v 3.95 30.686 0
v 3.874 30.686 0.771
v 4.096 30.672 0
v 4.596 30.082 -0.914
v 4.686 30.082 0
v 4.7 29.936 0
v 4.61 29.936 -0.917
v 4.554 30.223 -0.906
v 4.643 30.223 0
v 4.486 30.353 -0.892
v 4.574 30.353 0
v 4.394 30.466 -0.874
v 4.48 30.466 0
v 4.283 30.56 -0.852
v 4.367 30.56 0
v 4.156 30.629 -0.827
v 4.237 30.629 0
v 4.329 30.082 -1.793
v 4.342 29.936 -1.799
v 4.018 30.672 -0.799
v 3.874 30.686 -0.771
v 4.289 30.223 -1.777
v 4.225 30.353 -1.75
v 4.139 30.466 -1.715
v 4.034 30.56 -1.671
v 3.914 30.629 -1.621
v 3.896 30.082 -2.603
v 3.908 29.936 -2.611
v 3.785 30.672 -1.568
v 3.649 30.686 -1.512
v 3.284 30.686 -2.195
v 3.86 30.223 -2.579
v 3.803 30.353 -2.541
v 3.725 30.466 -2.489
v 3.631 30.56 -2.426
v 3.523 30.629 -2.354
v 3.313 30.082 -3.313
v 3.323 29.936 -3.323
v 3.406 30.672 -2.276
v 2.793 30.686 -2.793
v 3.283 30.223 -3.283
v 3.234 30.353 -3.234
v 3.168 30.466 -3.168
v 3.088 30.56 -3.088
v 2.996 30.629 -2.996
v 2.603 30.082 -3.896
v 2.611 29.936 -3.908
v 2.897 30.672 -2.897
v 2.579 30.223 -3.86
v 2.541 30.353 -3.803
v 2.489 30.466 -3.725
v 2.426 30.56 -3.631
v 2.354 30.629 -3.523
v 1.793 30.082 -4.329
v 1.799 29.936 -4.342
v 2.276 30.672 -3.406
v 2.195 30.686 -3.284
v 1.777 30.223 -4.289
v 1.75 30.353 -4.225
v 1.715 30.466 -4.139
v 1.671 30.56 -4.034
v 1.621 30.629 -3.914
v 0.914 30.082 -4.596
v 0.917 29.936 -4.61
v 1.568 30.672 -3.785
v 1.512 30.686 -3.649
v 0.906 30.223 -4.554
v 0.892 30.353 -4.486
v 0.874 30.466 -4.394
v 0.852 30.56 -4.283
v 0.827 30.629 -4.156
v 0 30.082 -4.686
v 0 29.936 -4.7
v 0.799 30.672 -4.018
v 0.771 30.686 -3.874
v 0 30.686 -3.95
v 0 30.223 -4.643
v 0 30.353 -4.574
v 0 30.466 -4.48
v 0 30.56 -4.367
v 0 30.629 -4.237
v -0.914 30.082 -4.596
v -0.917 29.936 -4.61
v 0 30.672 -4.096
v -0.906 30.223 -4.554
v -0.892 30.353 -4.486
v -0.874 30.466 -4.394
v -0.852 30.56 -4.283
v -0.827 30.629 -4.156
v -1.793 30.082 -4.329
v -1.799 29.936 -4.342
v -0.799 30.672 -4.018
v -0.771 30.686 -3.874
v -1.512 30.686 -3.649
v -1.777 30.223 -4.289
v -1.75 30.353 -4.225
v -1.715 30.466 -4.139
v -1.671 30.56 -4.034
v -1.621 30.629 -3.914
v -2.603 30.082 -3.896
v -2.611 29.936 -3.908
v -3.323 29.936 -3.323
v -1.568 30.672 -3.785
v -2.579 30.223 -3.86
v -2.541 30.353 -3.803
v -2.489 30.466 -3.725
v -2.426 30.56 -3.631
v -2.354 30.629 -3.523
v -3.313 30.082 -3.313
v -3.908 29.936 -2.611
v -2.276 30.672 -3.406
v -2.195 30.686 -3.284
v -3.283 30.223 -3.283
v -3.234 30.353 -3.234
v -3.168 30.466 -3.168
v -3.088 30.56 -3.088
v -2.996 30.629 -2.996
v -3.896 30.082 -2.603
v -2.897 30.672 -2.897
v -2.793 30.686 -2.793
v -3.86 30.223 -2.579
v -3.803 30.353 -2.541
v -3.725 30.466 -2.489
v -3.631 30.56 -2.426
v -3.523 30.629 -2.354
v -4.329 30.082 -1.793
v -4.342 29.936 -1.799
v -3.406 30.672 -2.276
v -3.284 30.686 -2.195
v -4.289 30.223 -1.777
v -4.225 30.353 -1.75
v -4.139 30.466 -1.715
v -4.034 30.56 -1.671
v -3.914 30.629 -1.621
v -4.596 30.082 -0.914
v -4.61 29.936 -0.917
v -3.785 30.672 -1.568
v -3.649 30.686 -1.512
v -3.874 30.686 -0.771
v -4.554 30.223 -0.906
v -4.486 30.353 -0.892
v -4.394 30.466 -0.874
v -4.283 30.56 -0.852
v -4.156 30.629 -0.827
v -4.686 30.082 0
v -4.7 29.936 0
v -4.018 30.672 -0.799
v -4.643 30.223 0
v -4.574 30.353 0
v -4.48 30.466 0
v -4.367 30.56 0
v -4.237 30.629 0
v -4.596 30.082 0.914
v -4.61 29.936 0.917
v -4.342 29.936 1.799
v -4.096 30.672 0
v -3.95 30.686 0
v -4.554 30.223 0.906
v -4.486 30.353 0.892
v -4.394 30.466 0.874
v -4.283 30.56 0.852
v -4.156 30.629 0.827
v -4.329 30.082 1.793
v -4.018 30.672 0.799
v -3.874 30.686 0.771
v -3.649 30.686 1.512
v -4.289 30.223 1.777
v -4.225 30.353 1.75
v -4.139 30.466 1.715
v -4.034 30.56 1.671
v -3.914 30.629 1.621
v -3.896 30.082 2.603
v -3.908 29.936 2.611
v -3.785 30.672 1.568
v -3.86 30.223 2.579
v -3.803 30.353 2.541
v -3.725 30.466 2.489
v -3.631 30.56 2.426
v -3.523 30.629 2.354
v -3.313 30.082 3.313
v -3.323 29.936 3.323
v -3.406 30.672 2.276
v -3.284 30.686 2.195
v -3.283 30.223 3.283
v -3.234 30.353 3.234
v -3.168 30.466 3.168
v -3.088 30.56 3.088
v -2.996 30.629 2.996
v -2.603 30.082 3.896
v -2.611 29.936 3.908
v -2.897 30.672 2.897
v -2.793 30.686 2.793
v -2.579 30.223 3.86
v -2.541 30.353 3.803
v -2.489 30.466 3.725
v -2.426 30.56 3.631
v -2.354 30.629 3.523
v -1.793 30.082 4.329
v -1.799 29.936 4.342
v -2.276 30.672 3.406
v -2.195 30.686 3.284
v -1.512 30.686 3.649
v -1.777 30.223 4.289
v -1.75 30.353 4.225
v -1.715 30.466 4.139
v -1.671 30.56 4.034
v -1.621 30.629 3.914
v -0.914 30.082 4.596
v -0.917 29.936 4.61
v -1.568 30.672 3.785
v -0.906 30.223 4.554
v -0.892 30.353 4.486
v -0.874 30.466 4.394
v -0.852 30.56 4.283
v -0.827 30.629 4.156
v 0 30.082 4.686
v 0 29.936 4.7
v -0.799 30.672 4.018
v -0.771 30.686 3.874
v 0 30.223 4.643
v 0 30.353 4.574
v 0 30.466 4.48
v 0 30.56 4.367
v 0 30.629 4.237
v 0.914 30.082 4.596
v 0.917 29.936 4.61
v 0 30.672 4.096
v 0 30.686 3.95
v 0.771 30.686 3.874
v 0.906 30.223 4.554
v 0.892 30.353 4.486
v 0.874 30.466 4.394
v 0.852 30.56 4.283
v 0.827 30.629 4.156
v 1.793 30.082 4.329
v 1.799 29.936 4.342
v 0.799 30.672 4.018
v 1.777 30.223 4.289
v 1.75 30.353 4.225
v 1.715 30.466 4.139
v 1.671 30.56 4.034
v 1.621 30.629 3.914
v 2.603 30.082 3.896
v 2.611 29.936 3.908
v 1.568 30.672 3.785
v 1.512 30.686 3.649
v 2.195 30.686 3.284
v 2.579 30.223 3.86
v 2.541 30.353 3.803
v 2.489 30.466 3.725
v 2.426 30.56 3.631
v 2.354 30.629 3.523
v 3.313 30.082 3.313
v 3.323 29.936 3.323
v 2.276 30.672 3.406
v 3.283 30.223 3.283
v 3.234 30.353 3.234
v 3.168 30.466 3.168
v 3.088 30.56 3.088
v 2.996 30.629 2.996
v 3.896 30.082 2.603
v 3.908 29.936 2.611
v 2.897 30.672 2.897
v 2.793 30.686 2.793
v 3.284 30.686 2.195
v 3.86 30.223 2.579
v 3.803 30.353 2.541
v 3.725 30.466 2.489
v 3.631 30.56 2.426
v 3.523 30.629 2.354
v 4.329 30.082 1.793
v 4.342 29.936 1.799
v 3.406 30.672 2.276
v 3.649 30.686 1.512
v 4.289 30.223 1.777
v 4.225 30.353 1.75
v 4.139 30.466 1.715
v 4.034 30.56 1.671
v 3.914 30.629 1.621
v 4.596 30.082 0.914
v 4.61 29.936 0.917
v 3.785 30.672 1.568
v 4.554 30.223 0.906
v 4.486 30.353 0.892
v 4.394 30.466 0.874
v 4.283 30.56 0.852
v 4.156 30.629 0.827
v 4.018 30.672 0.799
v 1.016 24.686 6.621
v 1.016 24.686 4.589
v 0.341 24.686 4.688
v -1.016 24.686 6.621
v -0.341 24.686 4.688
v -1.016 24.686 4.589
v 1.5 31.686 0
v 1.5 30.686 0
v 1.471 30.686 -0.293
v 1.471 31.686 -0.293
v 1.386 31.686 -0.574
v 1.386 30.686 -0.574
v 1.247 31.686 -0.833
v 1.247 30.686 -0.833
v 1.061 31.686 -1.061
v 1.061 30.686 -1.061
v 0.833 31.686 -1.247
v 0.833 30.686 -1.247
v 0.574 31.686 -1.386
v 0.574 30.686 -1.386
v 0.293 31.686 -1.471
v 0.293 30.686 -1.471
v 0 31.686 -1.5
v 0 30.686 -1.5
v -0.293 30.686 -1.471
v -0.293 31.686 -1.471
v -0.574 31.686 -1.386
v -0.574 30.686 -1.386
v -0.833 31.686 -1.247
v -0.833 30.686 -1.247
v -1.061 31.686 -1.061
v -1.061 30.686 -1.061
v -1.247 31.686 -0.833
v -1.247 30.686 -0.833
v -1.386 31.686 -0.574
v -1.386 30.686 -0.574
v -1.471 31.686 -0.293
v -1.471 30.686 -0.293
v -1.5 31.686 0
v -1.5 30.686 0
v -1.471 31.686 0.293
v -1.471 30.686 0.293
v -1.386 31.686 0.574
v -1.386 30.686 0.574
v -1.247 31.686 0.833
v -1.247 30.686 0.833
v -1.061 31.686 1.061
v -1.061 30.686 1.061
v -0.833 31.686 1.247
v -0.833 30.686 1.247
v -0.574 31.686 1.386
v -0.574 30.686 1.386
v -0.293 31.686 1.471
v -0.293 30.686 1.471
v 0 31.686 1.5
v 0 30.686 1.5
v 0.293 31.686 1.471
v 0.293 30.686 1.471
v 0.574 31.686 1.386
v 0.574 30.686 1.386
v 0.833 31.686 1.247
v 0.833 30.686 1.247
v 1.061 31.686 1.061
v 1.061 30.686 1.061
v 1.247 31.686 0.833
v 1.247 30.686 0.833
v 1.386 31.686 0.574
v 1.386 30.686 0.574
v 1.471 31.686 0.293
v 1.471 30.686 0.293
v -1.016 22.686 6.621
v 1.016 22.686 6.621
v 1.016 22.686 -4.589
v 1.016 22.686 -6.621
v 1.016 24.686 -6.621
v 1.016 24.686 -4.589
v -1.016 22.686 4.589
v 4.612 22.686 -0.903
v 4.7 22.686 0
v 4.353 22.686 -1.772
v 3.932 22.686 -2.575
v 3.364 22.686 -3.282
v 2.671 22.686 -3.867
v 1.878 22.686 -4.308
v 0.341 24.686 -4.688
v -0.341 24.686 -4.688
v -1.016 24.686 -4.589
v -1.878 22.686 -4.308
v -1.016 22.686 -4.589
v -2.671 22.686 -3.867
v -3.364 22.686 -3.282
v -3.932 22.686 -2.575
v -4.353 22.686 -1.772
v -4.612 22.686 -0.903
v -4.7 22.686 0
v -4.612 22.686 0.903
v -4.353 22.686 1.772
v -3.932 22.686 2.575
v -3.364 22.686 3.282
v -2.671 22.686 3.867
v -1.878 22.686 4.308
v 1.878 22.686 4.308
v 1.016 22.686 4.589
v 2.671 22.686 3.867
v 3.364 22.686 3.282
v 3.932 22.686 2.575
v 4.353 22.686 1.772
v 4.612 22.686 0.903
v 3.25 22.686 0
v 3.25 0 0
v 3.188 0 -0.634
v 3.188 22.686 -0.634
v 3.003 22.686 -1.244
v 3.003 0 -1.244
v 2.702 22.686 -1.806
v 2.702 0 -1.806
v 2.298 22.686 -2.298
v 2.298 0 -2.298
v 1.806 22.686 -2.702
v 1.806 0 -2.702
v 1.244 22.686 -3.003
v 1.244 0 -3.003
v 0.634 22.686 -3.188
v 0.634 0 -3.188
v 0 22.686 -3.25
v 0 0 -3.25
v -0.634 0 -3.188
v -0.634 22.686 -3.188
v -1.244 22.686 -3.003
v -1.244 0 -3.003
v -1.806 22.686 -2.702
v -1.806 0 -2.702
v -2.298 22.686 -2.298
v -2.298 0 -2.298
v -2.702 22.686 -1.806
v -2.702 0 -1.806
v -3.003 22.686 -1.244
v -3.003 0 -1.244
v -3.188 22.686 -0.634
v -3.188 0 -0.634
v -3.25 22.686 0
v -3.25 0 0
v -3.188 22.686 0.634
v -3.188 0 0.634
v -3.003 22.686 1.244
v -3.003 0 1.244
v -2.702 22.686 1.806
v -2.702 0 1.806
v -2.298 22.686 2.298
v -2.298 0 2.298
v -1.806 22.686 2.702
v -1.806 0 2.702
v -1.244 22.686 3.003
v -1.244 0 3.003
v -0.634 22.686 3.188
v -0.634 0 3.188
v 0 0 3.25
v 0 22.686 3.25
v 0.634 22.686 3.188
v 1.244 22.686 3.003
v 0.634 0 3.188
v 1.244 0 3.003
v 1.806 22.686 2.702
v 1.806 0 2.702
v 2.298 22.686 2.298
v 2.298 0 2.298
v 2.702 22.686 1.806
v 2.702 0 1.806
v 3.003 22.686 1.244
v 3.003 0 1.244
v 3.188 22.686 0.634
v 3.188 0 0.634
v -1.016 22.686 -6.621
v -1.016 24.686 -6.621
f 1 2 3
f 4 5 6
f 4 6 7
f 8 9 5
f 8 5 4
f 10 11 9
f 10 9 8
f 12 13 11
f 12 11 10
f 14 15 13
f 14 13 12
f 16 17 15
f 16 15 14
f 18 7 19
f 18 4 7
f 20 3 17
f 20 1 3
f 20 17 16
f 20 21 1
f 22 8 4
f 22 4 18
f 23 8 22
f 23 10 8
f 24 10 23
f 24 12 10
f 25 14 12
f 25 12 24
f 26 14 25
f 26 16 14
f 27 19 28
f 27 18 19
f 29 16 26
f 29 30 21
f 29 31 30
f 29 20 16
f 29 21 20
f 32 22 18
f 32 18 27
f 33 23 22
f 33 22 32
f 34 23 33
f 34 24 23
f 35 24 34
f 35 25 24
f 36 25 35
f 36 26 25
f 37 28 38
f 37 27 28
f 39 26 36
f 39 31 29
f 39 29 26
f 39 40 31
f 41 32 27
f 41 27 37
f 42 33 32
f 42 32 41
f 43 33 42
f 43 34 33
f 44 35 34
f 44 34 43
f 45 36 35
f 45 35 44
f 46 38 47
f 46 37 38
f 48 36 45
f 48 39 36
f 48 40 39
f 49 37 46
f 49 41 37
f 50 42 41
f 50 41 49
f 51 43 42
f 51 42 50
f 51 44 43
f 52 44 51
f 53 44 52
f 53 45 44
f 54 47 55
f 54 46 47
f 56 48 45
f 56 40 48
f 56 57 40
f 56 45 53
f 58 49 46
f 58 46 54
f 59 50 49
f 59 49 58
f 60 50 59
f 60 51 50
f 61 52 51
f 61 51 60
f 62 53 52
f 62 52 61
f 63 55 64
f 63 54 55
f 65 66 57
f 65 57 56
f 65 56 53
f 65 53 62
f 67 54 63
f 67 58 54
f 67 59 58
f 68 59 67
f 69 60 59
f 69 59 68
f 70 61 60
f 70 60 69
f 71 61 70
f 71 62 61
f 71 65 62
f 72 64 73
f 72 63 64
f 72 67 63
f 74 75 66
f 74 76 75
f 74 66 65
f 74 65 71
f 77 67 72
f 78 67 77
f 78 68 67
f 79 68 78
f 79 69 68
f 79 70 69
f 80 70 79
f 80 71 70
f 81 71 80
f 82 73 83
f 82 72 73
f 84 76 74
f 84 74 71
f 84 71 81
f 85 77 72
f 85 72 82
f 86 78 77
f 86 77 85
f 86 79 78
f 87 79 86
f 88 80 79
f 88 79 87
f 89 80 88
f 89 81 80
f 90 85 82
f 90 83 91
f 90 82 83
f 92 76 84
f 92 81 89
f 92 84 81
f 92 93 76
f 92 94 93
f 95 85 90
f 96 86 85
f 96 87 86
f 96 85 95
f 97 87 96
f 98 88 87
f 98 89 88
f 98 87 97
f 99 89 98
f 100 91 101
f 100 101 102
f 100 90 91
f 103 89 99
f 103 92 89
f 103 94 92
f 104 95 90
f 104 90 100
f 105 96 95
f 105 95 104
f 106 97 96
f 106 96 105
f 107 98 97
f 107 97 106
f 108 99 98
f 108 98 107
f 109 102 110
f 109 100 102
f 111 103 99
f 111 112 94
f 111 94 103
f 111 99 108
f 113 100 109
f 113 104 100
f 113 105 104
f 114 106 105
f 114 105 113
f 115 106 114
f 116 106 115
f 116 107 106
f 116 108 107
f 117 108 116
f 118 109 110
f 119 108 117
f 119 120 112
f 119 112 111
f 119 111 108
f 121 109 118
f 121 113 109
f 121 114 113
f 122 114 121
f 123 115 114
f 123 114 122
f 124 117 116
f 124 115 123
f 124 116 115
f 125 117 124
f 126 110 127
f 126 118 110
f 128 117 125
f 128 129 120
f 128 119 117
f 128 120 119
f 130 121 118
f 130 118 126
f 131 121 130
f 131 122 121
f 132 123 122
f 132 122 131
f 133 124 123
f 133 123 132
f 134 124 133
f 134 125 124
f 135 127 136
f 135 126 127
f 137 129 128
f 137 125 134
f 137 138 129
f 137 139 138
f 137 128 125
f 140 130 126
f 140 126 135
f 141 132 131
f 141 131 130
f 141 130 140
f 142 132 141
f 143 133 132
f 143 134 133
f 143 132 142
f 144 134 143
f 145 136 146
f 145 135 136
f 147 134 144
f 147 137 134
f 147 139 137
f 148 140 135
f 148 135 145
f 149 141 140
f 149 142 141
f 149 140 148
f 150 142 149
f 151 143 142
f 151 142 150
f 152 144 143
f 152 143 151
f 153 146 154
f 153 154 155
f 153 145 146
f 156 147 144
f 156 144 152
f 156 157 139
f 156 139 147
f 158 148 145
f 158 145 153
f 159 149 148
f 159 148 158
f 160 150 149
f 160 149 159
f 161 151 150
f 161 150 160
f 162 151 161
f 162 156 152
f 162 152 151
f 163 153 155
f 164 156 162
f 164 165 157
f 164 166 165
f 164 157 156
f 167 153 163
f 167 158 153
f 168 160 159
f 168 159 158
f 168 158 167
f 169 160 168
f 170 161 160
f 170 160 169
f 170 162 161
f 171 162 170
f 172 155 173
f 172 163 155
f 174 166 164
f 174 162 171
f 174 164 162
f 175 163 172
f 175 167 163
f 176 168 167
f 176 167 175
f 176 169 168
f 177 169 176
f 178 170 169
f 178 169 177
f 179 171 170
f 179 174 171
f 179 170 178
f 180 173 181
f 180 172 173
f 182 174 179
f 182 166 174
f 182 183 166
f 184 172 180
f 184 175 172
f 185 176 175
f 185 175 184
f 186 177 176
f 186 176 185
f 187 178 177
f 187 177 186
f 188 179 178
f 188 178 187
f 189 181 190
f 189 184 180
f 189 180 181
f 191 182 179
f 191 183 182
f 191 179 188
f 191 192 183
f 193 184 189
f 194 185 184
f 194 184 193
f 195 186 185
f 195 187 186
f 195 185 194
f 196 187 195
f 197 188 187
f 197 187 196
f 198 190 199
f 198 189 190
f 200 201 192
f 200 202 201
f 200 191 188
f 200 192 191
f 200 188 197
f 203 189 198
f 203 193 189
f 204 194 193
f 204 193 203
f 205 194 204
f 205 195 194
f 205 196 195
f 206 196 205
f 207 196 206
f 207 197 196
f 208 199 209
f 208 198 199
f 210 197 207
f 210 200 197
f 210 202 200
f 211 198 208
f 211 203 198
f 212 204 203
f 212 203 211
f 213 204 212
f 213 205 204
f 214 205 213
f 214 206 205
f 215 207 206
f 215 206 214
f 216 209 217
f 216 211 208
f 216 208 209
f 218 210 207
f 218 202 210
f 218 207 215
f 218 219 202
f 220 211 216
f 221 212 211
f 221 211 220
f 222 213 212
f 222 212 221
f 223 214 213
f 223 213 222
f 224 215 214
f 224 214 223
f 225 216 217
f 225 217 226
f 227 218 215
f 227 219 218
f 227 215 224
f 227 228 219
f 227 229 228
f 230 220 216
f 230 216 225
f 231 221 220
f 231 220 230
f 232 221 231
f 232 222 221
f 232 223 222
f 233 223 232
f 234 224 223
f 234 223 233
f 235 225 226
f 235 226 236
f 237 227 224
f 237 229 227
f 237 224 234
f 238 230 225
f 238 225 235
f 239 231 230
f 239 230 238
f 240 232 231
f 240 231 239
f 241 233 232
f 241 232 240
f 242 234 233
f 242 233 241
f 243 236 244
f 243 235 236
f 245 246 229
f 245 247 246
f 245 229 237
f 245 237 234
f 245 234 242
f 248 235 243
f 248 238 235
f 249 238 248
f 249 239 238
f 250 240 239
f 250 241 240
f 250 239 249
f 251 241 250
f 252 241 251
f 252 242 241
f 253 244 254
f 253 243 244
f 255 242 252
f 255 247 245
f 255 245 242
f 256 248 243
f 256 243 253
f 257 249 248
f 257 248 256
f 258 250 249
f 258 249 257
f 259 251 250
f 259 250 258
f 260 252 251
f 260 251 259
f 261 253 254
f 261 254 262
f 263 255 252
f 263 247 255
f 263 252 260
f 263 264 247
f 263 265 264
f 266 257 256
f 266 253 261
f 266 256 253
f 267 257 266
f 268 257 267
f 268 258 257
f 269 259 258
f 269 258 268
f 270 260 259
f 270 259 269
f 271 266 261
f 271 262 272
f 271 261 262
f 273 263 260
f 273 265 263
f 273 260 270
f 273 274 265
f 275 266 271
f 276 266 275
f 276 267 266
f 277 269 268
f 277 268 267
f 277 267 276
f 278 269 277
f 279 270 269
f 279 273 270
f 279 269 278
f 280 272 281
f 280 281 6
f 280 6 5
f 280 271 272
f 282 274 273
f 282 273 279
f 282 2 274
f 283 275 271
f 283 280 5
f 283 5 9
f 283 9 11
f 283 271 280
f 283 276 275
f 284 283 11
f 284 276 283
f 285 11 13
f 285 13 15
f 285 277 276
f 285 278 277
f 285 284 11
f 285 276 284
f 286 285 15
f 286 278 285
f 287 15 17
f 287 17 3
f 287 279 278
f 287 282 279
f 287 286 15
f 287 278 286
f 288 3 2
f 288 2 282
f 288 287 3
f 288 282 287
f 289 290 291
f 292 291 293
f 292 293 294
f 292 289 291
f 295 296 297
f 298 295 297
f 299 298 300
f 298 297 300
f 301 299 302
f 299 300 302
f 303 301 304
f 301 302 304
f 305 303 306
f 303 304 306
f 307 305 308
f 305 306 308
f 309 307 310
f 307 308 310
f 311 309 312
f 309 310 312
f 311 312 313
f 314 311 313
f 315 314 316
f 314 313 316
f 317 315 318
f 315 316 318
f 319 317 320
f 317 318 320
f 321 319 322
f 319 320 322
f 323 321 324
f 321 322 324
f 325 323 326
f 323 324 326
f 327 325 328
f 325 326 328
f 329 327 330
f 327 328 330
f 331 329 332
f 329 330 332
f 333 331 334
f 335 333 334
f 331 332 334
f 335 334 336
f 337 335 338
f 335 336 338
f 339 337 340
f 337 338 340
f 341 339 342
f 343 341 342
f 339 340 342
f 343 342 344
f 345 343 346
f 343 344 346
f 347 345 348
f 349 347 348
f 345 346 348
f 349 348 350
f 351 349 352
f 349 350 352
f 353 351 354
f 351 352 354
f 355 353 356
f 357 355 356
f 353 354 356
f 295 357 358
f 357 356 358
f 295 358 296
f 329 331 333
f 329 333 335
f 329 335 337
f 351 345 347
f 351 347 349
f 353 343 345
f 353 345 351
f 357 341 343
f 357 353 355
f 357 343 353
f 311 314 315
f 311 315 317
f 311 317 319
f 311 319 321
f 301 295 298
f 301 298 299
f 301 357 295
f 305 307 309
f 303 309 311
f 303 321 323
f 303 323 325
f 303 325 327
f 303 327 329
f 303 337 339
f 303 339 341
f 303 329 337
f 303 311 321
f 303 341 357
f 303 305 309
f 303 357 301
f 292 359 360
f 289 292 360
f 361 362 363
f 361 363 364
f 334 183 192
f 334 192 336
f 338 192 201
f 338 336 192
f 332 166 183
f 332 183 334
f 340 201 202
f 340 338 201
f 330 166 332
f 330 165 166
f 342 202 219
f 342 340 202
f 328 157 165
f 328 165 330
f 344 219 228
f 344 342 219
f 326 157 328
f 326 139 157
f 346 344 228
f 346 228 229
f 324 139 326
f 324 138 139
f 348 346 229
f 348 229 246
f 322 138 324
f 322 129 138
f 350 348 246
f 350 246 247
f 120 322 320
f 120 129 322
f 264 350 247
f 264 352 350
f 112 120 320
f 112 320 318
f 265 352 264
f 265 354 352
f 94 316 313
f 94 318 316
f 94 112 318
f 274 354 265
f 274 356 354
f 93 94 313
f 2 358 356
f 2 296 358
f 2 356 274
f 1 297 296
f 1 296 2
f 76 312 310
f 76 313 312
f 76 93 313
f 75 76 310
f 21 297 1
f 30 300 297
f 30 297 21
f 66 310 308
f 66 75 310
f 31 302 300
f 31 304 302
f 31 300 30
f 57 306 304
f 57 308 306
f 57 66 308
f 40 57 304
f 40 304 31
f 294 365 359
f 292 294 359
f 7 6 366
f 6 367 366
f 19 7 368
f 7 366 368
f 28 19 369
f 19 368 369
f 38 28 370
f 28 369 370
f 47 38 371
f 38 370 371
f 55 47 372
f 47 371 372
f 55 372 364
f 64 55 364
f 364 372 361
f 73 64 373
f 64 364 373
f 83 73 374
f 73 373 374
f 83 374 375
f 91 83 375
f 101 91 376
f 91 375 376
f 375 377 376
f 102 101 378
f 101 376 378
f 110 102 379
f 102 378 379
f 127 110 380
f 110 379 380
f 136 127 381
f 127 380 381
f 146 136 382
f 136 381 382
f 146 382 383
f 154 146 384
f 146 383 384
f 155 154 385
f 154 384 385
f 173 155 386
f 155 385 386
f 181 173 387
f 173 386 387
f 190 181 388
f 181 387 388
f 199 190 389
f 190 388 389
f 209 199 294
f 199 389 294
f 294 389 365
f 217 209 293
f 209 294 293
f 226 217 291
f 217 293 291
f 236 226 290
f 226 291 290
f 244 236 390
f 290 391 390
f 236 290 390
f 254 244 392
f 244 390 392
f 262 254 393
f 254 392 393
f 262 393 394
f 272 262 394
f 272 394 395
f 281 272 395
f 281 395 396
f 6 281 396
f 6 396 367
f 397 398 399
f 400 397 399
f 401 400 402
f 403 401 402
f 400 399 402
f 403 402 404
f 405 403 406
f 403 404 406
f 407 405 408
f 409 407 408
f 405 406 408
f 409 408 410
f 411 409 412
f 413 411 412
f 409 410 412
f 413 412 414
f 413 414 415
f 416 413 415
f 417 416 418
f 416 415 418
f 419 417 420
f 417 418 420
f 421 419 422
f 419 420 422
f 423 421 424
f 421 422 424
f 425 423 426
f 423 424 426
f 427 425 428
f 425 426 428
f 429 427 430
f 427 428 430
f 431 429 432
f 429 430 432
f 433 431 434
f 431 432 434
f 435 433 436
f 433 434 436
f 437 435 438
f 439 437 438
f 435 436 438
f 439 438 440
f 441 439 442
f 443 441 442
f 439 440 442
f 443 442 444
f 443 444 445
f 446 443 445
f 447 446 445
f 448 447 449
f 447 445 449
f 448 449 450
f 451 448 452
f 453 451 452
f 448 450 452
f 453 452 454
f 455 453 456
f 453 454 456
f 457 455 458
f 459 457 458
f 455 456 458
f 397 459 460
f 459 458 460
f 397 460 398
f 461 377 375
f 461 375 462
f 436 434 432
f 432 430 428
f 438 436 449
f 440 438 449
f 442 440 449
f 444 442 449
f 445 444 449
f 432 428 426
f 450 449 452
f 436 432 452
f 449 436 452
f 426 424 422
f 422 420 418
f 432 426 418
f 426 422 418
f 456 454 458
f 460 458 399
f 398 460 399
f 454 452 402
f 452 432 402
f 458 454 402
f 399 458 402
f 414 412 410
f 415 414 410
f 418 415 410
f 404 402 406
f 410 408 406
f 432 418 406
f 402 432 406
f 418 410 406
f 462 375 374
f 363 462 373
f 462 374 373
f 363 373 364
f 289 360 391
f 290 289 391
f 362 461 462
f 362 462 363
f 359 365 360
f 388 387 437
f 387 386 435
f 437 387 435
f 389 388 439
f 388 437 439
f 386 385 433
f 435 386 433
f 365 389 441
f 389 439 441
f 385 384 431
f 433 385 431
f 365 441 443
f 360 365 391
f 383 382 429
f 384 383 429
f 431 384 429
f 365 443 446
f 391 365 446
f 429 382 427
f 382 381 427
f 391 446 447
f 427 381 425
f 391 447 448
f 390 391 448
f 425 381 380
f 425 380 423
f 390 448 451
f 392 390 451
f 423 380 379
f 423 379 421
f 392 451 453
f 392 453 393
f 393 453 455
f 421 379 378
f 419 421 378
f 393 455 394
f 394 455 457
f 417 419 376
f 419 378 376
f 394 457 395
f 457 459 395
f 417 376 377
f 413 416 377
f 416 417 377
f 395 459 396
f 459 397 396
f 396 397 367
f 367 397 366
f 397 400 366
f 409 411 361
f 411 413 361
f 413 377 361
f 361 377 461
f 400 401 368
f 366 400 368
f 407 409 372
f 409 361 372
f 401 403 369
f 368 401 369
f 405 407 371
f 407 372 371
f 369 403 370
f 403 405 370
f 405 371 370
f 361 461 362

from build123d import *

# Parameters (mm, degrees)
SKETCH1_R           = 3.25
BOSS_EXTRUDE1_DEPTH = 22.686
SKETCH6_R           = 4.7
BOSS_EXTRUDE2_DEPTH = 8
FILLET2_R           = 0.75
SKETCH7_R           = 1.5
BOSS_EXTRUDE3_DEPTH = 1
BOSS_EXTRUDE4_DEPTH = 2


with BuildPart() as part:
    # Sketch1 → Boss-Extrude1 (new body)
    with BuildSketch(Plane(origin=(0, 0, 0), x_dir=(1, 0, 0), z_dir=(0, 1, 0))):
        Circle(SKETCH1_R)
    extrude(amount=BOSS_EXTRUDE1_DEPTH)

    # Sketch6 → Boss-Extrude2 (add)
    with BuildSketch(Plane(origin=(0, 22.686, 0), x_dir=(1, 0, 0), z_dir=(0, 1, 0))):
        Circle(SKETCH6_R)
    extrude(amount=BOSS_EXTRUDE2_DEPTH)

    # Fillet2
    fillet2_edges = [part.edges().sort_by_distance(p)[0] for p in [
        (-4.7, 30.686, 0),
    ]]
    fillet(fillet2_edges, radius=FILLET2_R)

    # Sketch7 → Boss-Extrude3 (add)
    with BuildSketch(Plane(origin=(0, 30.686, 0), x_dir=(1, 0, 0), z_dir=(0, 1, 0))):
        Circle(SKETCH7_R)
    extrude(amount=BOSS_EXTRUDE3_DEPTH)

    # Sketch8 → Boss-Extrude4 (add)
    with BuildSketch(Plane.XZ.offset(-22.686)):
        with BuildLine():
            Line((-1.016, 4.588871757), (-1.016, 6.620871757))
            Line((-1.016, 6.620871757), (1.016, 6.620871757))
            Line((1.016, 6.620871757), (1.016, 4.588871757))
            ThreePointArc((1.016, 4.588871757), (0, 4.7), (-1.016, 4.588871757))
        make_face()
        with BuildLine():
            Line((1.016, -6.620871757), (1.016, -4.588871757))
            ThreePointArc((1.016, -4.588871757), (0, -4.7), (-1.016, -4.588871757))
            Line((-1.016, -4.588871757), (-1.016, -6.620871757))
            Line((-1.016, -6.620871757), (1.016, -6.620871757))
        make_face()
    extrude(amount=-BOSS_EXTRUDE4_DEPTH)


solid = part.part
